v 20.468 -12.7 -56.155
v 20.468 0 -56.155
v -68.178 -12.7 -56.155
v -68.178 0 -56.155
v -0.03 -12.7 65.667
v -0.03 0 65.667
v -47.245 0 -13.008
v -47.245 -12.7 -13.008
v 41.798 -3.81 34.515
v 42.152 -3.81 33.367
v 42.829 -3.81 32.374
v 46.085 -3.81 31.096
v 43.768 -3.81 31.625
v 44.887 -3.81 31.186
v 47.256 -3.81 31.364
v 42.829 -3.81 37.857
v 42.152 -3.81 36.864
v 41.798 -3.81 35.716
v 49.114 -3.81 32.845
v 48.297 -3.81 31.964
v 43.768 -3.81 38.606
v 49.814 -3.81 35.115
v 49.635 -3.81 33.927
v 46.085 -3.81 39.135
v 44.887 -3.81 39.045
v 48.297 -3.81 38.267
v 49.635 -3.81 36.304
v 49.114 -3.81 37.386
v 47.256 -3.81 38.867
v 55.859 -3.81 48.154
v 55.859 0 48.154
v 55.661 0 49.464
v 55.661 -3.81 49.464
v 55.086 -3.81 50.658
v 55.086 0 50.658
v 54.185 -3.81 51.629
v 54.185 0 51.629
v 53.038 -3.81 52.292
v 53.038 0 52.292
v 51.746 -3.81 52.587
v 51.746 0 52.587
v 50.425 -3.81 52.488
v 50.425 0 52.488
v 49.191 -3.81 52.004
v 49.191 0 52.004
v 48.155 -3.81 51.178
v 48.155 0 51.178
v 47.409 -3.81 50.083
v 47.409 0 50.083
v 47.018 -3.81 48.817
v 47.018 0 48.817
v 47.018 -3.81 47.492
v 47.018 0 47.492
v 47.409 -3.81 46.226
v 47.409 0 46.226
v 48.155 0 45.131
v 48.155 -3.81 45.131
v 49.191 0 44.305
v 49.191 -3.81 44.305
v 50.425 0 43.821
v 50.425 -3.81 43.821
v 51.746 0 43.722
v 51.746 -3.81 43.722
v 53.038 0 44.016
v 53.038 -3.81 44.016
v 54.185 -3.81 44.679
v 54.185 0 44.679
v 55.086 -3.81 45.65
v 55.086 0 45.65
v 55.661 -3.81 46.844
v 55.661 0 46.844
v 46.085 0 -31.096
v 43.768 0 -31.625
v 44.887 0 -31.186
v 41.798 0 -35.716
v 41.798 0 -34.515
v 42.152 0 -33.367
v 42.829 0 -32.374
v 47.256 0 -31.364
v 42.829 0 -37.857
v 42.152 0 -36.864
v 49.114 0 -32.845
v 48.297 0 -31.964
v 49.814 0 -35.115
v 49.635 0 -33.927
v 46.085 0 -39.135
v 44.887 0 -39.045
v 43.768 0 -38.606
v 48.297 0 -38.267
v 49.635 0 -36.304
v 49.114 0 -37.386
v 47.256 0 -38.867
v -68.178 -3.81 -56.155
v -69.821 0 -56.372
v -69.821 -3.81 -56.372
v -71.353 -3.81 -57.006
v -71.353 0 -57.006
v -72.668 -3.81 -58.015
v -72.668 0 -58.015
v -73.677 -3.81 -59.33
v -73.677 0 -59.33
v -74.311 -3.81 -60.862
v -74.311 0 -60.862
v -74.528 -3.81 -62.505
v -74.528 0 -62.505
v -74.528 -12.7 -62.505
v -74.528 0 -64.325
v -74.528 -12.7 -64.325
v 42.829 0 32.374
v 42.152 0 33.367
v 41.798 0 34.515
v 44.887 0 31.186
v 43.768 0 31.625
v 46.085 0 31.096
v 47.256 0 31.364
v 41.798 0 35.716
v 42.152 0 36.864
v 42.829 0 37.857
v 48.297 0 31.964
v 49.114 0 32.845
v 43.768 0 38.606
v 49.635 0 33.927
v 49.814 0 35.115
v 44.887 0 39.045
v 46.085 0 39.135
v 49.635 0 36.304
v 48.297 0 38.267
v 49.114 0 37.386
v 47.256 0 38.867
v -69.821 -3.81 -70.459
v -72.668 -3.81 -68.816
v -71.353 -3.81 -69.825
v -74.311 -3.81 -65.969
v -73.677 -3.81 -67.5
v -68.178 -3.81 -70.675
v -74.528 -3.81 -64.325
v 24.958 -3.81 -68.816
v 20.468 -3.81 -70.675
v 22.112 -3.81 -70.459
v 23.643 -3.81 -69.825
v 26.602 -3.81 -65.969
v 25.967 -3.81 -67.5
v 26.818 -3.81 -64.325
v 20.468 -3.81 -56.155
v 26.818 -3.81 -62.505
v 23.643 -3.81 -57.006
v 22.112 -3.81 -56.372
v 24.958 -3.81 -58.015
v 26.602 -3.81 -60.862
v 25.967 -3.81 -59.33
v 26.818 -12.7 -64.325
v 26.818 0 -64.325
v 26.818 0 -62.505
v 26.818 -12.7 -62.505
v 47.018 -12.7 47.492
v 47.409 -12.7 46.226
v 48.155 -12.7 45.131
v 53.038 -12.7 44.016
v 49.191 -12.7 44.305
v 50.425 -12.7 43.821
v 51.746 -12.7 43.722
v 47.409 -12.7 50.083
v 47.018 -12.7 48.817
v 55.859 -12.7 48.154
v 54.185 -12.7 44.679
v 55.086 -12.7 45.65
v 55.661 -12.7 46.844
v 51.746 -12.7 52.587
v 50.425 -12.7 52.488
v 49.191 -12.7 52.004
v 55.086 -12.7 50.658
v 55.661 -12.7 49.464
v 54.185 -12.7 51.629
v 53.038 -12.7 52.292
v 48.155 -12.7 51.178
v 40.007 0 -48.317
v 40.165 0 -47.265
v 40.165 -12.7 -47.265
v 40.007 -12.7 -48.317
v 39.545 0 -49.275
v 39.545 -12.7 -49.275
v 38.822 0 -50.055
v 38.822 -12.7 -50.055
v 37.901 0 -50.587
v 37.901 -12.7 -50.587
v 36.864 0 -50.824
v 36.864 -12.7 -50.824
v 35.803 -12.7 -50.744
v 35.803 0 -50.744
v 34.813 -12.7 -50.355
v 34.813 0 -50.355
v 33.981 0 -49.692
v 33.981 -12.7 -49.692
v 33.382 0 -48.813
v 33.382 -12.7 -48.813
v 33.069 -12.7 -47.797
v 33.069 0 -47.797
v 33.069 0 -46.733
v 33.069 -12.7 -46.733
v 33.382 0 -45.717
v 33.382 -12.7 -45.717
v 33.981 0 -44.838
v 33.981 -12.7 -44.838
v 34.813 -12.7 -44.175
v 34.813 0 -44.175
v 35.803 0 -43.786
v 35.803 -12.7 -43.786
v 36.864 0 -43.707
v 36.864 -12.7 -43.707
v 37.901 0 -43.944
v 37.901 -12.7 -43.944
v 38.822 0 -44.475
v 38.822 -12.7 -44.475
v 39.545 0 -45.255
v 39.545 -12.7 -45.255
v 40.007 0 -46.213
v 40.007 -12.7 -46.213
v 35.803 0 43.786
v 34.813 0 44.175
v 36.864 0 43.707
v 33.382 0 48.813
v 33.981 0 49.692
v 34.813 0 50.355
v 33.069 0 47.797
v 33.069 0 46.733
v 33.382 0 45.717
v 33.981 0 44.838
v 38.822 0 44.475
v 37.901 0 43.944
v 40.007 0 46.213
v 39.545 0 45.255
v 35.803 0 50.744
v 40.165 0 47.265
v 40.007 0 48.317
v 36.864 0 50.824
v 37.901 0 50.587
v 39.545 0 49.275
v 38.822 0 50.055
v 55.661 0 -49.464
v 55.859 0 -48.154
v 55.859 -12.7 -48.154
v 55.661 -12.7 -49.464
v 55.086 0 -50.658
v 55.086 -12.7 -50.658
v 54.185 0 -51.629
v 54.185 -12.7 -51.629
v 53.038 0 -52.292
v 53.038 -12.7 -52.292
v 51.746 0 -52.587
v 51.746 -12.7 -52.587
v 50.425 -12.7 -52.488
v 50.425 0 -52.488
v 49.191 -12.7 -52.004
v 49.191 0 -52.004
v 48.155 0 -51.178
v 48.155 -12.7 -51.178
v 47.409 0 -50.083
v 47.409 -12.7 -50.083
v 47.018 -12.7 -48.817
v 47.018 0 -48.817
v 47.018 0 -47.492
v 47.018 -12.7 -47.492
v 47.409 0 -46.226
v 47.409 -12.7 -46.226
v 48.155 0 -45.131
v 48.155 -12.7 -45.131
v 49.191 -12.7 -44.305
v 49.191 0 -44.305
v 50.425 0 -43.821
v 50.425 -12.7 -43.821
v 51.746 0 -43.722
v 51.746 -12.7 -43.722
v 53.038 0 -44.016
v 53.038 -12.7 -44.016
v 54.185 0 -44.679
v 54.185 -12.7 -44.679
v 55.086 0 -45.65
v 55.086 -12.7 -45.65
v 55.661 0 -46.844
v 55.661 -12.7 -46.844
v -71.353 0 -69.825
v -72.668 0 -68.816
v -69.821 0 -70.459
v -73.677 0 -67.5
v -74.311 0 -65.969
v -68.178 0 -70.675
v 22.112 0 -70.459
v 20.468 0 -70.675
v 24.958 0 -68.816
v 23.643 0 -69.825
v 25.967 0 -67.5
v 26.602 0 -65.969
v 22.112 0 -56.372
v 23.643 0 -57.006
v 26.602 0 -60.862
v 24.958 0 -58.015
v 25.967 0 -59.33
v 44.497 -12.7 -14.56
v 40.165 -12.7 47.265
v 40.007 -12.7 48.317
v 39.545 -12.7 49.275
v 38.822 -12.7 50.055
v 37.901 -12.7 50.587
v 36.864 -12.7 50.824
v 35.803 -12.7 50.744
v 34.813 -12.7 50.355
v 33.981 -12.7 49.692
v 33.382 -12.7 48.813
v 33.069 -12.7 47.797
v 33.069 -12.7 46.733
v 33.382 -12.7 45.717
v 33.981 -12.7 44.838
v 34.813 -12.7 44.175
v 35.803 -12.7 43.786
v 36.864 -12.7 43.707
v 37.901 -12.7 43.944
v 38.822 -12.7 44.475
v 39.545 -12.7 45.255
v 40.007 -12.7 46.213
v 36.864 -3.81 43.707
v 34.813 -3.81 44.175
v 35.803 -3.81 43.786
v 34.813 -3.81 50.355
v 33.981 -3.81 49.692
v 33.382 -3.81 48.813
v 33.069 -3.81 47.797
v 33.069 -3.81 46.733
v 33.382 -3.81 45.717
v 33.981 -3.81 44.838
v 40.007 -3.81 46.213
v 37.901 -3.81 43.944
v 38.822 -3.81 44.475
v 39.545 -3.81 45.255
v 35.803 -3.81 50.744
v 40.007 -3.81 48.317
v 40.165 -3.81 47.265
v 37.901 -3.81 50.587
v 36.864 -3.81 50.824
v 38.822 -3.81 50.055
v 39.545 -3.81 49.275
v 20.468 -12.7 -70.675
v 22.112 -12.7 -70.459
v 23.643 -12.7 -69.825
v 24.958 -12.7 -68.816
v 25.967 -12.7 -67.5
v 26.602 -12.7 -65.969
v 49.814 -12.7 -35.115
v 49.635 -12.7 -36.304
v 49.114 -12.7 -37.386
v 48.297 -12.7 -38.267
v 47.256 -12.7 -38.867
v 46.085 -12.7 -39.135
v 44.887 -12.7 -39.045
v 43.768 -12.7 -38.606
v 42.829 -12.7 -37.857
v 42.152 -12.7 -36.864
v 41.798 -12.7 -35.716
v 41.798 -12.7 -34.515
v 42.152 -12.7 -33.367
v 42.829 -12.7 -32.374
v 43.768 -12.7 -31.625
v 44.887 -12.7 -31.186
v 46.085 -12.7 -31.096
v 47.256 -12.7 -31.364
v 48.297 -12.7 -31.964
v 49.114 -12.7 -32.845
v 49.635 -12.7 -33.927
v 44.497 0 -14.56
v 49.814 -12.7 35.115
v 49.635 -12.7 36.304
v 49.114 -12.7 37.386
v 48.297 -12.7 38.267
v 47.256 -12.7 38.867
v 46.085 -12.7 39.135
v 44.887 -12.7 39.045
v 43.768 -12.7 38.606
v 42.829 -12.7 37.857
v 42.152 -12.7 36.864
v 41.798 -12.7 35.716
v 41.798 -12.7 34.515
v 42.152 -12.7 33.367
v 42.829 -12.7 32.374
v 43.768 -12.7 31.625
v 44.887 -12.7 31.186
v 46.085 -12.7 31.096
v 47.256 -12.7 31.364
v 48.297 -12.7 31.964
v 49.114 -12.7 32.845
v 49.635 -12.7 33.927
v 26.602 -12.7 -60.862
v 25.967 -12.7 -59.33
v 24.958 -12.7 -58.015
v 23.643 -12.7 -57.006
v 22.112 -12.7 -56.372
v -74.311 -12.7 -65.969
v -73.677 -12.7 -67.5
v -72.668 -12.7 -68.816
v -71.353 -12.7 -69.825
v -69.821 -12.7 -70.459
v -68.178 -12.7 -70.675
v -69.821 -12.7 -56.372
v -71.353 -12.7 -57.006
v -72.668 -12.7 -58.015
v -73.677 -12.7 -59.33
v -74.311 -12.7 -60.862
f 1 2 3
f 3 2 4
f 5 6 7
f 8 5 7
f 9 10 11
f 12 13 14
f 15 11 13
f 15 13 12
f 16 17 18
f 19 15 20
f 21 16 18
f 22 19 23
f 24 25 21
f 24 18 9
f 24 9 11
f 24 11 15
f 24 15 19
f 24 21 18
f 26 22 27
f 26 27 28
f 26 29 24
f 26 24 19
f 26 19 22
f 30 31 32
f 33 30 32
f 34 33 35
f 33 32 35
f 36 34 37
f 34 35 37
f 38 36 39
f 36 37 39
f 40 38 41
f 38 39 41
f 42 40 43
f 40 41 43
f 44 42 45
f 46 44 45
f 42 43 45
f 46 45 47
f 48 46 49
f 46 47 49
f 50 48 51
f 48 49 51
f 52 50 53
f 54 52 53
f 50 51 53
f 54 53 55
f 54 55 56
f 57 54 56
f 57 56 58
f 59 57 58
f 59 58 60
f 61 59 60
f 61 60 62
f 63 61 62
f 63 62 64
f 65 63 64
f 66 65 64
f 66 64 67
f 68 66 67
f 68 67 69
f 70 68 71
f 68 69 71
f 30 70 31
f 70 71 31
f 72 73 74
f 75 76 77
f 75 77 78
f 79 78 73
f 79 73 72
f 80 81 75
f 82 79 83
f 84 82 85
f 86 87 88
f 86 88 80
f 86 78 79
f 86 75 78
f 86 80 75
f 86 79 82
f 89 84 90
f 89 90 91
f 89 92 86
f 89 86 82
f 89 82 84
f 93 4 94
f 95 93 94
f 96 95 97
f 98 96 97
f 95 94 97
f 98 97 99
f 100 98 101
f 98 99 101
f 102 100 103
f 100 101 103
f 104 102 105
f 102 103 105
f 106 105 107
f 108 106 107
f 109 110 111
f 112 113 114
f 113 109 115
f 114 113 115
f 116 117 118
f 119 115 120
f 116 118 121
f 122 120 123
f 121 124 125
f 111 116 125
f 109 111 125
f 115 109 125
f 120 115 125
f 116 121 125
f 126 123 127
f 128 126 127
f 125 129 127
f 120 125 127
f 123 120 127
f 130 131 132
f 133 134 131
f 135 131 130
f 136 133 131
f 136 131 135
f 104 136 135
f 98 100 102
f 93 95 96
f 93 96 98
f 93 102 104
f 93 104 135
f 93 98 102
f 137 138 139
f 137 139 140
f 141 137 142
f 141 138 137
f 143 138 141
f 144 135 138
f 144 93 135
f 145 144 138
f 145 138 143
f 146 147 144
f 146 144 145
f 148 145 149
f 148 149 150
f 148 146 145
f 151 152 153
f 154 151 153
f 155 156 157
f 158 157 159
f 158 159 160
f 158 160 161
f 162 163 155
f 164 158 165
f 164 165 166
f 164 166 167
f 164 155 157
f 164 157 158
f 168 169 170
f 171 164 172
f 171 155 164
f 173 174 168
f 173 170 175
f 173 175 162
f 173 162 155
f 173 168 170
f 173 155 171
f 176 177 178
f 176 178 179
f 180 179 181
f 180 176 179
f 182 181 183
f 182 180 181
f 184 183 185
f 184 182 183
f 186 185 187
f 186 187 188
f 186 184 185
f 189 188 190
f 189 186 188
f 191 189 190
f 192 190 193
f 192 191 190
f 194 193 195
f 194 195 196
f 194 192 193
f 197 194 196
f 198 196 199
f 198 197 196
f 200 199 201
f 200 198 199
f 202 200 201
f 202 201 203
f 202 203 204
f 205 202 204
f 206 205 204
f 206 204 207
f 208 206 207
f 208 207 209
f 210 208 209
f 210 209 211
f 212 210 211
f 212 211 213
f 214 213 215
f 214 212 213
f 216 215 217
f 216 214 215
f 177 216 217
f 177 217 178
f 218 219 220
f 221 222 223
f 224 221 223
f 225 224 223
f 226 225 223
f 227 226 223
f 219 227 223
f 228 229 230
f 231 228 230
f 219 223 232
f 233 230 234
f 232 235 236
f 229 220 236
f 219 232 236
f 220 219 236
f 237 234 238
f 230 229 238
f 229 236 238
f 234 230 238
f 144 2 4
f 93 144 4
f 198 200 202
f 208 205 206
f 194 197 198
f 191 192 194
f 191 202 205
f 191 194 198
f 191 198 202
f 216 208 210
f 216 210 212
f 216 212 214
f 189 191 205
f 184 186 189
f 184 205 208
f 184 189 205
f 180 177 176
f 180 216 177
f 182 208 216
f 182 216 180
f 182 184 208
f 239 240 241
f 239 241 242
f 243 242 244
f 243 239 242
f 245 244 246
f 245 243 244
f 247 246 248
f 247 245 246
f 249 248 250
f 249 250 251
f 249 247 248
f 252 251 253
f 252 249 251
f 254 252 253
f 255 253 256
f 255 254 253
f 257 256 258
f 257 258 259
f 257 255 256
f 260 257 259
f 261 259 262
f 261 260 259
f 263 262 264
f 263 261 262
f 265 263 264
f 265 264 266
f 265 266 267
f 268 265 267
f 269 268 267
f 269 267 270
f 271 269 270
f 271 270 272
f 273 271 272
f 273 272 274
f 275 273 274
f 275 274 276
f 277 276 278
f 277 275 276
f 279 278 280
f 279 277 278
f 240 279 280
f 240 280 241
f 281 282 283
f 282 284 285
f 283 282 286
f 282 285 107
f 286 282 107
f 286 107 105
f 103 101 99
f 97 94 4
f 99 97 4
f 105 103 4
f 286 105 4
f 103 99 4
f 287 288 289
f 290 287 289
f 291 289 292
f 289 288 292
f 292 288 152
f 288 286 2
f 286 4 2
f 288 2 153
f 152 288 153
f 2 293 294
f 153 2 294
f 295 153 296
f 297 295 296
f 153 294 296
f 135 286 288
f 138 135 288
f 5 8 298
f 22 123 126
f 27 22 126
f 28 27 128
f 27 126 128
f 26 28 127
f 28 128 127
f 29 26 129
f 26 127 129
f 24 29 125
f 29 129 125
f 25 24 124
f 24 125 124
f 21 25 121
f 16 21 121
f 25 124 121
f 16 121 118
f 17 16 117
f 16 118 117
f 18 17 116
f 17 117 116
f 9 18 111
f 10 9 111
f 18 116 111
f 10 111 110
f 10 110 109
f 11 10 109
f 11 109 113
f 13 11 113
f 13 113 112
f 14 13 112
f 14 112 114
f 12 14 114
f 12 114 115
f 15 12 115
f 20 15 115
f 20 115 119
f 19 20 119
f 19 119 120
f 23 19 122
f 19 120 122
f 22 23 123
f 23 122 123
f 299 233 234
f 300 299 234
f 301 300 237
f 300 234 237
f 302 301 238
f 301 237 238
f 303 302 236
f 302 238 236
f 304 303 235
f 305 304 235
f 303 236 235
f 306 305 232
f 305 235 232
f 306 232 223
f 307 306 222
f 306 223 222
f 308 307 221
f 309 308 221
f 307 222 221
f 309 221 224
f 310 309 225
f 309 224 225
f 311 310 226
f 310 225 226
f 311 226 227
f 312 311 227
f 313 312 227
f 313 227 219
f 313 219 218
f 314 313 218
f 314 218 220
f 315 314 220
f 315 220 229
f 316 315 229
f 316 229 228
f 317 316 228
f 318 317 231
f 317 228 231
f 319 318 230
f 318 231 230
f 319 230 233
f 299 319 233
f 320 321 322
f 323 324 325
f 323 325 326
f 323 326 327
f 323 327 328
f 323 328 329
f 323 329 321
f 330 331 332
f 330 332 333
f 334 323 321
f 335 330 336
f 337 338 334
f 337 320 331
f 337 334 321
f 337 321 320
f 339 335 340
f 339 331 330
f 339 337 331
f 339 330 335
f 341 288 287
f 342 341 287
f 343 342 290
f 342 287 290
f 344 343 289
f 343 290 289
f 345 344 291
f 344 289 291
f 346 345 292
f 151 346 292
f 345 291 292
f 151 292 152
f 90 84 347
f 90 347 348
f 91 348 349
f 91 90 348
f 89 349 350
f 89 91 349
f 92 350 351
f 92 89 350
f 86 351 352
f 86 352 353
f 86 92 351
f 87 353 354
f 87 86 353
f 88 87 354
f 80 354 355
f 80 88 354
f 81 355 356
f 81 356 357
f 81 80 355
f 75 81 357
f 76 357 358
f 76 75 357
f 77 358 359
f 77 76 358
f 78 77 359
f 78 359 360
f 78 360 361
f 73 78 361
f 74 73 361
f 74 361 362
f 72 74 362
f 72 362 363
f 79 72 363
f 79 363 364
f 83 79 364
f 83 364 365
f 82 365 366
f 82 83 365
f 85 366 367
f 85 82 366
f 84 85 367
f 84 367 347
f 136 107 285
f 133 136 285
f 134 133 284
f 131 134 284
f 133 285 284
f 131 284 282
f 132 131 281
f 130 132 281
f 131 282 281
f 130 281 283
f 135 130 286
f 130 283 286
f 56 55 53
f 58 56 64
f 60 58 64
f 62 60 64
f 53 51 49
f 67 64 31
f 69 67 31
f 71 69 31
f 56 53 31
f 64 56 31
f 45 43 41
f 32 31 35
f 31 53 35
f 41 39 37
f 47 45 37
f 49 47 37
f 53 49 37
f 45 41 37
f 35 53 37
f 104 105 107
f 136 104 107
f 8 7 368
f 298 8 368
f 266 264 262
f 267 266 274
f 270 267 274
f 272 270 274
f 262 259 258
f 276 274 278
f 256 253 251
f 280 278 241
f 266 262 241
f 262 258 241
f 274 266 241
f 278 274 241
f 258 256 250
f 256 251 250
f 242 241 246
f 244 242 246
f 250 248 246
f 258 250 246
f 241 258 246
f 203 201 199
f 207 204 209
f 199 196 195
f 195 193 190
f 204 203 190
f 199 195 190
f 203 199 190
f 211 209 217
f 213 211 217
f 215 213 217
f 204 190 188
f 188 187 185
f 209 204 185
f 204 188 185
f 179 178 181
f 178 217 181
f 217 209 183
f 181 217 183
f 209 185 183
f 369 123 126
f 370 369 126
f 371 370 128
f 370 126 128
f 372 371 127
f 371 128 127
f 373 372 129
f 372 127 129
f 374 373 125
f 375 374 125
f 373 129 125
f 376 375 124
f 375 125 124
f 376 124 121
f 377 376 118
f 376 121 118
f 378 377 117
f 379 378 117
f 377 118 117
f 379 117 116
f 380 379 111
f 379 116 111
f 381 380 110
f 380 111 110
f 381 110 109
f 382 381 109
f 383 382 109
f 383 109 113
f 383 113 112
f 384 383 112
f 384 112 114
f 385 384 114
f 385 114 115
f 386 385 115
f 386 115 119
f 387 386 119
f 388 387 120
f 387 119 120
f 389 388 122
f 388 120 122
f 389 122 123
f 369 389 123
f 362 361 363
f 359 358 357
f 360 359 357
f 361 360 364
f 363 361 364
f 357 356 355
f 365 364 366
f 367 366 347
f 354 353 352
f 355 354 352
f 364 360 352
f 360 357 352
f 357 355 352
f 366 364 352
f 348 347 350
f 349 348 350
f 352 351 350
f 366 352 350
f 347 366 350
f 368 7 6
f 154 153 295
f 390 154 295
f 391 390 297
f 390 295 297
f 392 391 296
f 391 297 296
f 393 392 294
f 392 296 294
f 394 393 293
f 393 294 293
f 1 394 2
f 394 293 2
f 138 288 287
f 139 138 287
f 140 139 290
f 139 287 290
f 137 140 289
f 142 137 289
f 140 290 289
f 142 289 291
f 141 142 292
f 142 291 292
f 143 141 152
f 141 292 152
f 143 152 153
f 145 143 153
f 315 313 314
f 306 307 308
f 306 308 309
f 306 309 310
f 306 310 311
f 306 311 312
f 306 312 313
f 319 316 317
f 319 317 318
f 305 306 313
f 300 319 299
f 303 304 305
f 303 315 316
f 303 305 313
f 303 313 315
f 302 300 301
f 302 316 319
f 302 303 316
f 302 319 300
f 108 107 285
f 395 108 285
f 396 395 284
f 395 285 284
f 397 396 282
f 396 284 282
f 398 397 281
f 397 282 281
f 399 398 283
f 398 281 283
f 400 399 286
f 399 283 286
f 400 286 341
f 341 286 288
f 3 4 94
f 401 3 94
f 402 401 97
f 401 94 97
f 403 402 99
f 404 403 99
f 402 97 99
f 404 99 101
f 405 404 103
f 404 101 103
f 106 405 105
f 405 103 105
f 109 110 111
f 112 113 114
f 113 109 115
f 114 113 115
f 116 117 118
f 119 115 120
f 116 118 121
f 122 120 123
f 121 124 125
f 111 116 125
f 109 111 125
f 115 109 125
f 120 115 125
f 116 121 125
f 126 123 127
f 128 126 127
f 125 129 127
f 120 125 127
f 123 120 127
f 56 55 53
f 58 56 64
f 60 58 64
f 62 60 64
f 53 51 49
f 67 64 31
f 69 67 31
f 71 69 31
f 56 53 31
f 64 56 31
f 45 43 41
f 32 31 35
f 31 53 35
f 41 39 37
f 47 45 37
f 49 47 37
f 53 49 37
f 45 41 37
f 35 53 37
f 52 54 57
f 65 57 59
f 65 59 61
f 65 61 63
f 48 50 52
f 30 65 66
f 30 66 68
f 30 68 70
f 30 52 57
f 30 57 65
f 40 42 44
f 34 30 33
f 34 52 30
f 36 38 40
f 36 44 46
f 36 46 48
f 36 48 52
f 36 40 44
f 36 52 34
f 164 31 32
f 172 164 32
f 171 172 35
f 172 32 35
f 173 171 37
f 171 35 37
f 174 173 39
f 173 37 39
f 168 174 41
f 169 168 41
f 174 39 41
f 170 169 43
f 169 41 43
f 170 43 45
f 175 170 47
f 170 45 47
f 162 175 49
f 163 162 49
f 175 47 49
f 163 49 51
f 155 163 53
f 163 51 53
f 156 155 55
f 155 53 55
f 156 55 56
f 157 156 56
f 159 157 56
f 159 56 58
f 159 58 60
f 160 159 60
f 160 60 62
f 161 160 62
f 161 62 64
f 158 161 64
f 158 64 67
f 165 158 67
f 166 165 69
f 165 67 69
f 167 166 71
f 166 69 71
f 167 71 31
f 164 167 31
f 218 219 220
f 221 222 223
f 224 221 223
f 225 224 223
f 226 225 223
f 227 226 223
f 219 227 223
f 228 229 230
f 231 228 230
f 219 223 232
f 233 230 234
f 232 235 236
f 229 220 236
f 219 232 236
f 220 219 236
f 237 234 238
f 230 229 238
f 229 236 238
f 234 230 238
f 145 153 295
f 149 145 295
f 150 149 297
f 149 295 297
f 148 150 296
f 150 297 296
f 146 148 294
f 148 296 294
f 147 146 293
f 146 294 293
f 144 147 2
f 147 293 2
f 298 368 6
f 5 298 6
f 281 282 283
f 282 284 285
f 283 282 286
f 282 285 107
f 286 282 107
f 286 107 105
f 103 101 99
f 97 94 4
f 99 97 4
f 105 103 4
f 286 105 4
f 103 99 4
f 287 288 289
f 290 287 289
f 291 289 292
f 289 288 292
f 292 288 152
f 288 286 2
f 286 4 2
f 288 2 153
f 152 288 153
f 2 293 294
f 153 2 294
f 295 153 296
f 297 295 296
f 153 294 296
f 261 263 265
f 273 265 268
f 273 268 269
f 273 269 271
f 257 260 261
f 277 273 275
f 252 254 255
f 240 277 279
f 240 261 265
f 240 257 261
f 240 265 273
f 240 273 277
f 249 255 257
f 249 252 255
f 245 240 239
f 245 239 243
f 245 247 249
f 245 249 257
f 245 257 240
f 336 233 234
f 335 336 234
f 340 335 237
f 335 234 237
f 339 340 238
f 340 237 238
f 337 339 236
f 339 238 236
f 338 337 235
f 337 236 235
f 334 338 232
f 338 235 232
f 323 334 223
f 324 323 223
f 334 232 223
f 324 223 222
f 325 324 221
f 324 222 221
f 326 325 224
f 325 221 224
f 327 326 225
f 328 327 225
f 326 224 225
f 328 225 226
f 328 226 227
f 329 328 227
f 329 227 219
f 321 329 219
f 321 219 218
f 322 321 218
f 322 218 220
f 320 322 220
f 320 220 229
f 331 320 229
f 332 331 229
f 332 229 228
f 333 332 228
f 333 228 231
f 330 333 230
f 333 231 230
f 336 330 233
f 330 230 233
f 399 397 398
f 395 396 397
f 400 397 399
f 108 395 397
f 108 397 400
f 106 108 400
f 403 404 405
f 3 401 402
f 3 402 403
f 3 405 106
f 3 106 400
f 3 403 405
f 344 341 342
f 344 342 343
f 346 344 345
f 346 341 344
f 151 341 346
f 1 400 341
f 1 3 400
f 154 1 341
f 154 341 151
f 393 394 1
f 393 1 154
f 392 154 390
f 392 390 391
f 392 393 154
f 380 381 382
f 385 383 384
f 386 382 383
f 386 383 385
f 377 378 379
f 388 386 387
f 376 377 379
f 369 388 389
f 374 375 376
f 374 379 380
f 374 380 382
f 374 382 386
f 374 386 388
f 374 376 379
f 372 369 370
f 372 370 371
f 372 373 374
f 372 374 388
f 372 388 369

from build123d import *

# Parameters (mm, degrees)
F1_DEPTH = 12.7
F3_DEPTH = 12.7
F2_R     = 3.56832736
F2_R_2   = 4.0305690693
F2_R_3   = 4.445001483
F4_DEPTH = 3.81


with BuildPart() as f1:
    # F0 (on Front) → F1 (new body)
    with BuildSketch(Plane.XZ):
        Polygon((-47.2452260642, -13.0078209857), (44.4971116884, -14.5596424118), (-0.0301404108, 65.6674633975), align=None)
    extrude(amount=F1_DEPTH)


with BuildPart() as f3:
    # F2 (on Front) → F3 (new body)
    with BuildSketch(Plane.XZ):
        with BuildLine():
            Line((20.4681655556, -56.15516752), (-68.1778298855, -56.15516752))
            ThreePointArc((-68.1778298855, -56.15516752), (-72.667957946, -58.0150394595), (-74.5278298855, -62.50516752))
            Line((-74.5278298855, -62.50516752), (-74.5278298855, -64.3254997373))
            ThreePointArc((-74.5278298855, -64.3254997373), (-72.667957946, -68.8156277978), (-68.1778298855, -70.6754997373))
            Line((-68.1778298855, -70.6754997373), (20.4681655556, -70.6754997373))
            ThreePointArc((20.4681655556, -70.6754997373), (24.9582936161, -68.8156277978), (26.8181655556, -64.3254997373))
            Line((26.8181655556, -64.3254997373), (26.8181655556, -62.50516752))
            ThreePointArc((26.8181655556, -62.50516752), (24.9582936161, -58.0150394595), (20.4681655556, -56.15516752))
        make_face()
    extrude(amount=F3_DEPTH)


with BuildPart() as f3b:
    # F2 (on Front) → F3, piece 2 (new body)
    with BuildSketch(Plane.XZ):
        with Locations((36.5971662104, 47.2651682794)):
            Circle(F2_R)
    extrude(amount=F3_DEPTH)


with BuildPart() as f3c:
    # F2 (on Front) → F3, piece 3 (new body)
    with BuildSketch(Plane.XZ):
        with Locations((45.7835011184, 35.1154990494)):
            Circle(F2_R_2)
    extrude(amount=F3_DEPTH)


with BuildPart() as f3d:
    # F2 (on Front) → F3, piece 4 (new body)
    with BuildSketch(Plane.XZ):
        with Locations((51.413834095, 48.1541678309)):
            Circle(F2_R_3)
    extrude(amount=F3_DEPTH)


with BuildPart() as f4:
    # F2 (on Front) → F4 (new body)
    with BuildSketch(Plane.XZ):
        with BuildLine():
            Line((20.4681655556, -56.15516752), (-68.1778298855, -56.15516752))
            ThreePointArc((-68.1778298855, -56.15516752), (-72.667957946, -58.0150394595), (-74.5278298855, -62.50516752))
            Line((-74.5278298855, -62.50516752), (-74.5278298855, -64.3254997373))
            ThreePointArc((-74.5278298855, -64.3254997373), (-72.667957946, -68.8156277978), (-68.1778298855, -70.6754997373))
            Line((-68.1778298855, -70.6754997373), (20.4681655556, -70.6754997373))
            ThreePointArc((20.4681655556, -70.6754997373), (24.9582936161, -68.8156277978), (26.8181655556, -64.3254997373))
            Line((26.8181655556, -64.3254997373), (26.8181655556, -62.50516752))
            ThreePointArc((26.8181655556, -62.50516752), (24.9582936161, -58.0150394595), (20.4681655556, -56.15516752))
        make_face()
    extrude(amount=F4_DEPTH)


with BuildPart() as f4b:
    # F2 (on Front) → F4, piece 2 (new body)
    with BuildSketch(Plane.XZ):
        with Locations((36.5971662104, 47.2651682794)):
            Circle(F2_R)
    extrude(amount=F4_DEPTH)


with BuildPart() as f4c:
    # F2 (on Front) → F4, piece 3 (new body)
    with BuildSketch(Plane.XZ):
        with Locations((45.7835011184, 35.1154990494)):
            Circle(F2_R_2)
    extrude(amount=F4_DEPTH)


with BuildPart() as f4d:
    # F2 (on Front) → F4, piece 4 (new body)
    with BuildSketch(Plane.XZ):
        with Locations((51.413834095, 48.1541678309)):
            Circle(F2_R_3)
    extrude(amount=F4_DEPTH)


with BuildPart() as f5_1:
    # F5: instance of F3d
    add(f3d.part.mirror(Plane.XY))


with BuildPart() as f5_2:
    # F5: instance of F3b
    add(f3b.part.mirror(Plane.XY))


with BuildPart() as f5_3:
    # F5: instance of F3c
    add(f3c.part.mirror(Plane.XY))


solid = Compound([f1.part, f3.part, f3b.part, f3c.part, f3d.part, f4.part, f4b.part, f4c.part, f4d.part, f5_1.part, f5_2.part, f5_3.part])
